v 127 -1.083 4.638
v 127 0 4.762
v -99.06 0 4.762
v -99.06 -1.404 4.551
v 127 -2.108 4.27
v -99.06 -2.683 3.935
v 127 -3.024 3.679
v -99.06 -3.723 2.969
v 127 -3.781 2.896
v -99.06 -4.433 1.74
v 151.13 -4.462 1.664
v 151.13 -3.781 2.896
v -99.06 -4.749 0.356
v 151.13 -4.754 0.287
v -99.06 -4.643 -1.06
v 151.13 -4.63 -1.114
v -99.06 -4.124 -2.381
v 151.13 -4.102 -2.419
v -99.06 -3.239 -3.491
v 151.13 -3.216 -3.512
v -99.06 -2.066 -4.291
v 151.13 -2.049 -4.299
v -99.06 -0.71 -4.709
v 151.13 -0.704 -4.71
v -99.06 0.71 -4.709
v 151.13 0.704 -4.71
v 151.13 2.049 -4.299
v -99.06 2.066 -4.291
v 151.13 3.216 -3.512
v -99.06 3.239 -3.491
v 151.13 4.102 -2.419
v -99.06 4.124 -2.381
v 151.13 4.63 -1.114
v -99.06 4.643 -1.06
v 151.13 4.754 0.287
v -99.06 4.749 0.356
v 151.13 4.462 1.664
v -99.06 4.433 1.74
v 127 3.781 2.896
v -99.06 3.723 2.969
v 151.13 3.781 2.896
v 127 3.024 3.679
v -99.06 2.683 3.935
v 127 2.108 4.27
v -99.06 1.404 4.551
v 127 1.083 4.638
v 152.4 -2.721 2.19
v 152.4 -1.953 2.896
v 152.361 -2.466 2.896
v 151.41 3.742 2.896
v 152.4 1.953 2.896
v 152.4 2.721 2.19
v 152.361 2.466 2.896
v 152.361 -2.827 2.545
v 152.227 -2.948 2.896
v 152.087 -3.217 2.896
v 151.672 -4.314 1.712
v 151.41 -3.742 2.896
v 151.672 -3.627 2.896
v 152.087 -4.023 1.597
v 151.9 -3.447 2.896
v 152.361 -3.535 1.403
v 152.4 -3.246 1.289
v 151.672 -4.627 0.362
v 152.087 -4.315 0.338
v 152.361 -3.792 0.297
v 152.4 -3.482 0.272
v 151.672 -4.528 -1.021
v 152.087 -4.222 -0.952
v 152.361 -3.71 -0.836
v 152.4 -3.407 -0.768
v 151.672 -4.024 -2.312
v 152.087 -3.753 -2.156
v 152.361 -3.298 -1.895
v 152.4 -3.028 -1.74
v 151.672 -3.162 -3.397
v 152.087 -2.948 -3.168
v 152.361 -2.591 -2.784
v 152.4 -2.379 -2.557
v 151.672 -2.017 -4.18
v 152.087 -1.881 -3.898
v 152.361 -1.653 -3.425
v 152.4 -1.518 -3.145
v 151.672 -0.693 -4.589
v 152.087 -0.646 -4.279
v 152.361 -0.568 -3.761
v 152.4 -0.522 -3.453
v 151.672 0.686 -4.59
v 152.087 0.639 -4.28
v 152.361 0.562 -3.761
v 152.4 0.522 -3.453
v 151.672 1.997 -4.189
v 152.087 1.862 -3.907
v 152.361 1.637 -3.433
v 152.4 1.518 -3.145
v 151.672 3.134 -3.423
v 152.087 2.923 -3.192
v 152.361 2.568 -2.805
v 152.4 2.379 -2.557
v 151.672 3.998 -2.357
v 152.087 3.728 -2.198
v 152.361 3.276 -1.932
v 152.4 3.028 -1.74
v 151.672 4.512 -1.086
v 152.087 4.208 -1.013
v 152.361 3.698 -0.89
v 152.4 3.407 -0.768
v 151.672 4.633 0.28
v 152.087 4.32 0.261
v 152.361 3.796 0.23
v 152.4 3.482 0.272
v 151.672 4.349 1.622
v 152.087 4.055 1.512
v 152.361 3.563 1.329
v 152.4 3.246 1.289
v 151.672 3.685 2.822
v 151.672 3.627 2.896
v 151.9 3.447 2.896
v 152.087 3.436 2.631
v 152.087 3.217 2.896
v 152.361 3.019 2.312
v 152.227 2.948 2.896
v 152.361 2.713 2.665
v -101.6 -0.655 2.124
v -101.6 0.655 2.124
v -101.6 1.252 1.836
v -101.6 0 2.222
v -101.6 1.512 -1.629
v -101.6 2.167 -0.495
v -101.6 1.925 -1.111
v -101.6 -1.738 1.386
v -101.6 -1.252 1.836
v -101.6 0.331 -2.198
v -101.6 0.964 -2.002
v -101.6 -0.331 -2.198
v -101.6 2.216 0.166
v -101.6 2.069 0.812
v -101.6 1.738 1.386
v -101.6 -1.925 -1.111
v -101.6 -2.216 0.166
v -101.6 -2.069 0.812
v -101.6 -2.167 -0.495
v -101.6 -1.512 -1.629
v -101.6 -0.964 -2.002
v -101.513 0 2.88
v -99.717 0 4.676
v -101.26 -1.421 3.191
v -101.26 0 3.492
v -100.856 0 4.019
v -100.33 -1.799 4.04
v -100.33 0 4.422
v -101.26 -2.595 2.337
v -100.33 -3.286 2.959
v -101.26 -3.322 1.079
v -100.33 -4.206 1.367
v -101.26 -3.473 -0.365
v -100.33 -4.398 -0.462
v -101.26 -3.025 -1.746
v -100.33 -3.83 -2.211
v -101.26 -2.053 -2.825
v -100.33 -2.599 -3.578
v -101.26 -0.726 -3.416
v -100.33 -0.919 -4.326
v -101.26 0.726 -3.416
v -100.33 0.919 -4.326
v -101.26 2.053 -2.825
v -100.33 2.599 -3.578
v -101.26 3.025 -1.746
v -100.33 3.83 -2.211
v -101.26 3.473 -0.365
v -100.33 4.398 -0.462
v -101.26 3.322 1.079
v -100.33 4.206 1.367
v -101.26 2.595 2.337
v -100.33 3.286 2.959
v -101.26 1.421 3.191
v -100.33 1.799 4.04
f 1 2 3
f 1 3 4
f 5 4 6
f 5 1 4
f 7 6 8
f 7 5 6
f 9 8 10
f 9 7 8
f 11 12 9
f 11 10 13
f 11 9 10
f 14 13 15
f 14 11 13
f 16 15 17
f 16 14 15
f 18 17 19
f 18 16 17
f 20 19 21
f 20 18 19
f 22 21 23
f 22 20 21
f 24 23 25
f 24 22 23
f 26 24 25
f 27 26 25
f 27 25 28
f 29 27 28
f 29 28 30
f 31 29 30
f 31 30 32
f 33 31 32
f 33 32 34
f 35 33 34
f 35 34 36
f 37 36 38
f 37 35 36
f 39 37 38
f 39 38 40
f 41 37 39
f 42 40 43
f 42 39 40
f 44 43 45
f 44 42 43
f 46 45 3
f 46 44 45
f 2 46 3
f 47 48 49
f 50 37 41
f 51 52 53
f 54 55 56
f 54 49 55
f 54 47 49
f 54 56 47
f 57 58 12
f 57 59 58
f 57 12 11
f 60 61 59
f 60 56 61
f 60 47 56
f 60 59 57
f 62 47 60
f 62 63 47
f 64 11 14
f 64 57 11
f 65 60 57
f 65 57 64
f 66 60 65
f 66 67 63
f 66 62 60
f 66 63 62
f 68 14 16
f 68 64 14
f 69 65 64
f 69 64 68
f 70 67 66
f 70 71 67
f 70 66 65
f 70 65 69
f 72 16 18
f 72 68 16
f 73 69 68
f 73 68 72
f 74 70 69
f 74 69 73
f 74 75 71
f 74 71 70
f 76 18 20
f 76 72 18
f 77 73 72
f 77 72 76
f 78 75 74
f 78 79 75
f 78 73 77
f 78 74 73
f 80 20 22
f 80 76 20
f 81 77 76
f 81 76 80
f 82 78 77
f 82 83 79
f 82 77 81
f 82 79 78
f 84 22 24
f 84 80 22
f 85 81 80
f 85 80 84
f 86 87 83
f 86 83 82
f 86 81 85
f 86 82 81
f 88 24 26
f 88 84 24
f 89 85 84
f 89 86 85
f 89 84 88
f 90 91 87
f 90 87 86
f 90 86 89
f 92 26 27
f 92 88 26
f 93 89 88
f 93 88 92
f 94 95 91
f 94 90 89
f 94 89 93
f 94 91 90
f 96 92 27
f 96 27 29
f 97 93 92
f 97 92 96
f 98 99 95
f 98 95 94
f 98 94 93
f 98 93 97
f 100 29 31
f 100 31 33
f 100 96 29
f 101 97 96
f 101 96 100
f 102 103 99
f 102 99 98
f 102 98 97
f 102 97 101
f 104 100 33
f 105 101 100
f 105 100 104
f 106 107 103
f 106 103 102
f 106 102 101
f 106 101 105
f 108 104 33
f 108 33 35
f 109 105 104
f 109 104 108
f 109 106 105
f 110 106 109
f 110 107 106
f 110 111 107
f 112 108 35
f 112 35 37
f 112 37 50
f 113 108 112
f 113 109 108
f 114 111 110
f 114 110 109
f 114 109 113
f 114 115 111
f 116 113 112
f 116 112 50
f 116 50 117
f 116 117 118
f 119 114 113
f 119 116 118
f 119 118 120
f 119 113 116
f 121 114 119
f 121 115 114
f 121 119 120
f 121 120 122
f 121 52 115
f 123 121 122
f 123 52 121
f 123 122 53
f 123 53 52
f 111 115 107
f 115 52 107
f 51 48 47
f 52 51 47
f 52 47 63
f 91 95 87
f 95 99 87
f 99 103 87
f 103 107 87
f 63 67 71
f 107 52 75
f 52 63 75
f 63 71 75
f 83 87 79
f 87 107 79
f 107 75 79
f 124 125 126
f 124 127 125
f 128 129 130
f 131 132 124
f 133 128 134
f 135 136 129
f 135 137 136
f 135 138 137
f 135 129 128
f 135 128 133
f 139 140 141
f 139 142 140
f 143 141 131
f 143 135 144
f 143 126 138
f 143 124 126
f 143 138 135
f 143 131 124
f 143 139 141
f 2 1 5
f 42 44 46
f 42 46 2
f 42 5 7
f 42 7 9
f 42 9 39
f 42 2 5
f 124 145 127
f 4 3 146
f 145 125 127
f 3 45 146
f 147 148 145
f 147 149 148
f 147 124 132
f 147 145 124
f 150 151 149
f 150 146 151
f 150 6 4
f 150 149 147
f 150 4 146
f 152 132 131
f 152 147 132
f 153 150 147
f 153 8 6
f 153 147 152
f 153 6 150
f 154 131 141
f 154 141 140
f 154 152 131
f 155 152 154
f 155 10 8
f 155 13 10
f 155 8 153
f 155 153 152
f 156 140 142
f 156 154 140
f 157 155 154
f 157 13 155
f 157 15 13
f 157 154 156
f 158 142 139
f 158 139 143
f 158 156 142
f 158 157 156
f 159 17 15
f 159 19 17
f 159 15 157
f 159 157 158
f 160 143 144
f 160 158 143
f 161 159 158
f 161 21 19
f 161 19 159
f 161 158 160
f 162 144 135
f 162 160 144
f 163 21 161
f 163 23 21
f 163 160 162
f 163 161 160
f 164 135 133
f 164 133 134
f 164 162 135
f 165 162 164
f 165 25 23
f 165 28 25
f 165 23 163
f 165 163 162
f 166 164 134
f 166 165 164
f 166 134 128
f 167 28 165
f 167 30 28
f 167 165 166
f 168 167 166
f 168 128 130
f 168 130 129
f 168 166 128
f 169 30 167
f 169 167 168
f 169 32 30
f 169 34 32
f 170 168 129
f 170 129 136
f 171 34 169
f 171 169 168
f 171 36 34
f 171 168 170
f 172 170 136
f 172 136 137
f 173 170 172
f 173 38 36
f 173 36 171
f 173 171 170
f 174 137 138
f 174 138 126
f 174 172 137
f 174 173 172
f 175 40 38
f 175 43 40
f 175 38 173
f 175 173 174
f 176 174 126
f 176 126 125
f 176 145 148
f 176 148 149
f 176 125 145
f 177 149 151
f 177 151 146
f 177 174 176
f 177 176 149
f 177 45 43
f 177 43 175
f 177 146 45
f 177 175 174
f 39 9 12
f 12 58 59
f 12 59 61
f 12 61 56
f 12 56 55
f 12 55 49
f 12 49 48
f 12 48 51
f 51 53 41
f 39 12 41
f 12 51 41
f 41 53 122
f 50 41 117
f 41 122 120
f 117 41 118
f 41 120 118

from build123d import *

# Parameters (mm, degrees)
F0_W     = 254
F0_H     = 4.7625
F3_DEPTH = 25.4
F4_R     = 2.54
F5_R     = 1.27


with BuildPart() as f1:
    # F0 (on Front) → F1 (revolve)
    with BuildSketch(Plane.XZ):
        with Locations((25.4, 2.38125)):
            Rectangle(F0_W, F0_H)
    revolve(axis=Axis((25.4, 0, 0), (1, 0, 0)))

    # F2 (on face) → F3 (cut)
    with BuildSketch(Plane.YZ.offset(152.4)):
        with BuildLine():
            ThreePointArc((3.781125, 2.8956), (0, 4.7625), (-3.781125, 2.8956))
            Line((-3.781125, 2.8956), (3.781125, 2.8956))
        make_face()
    extrude(amount=-F3_DEPTH, mode=Mode.SUBTRACT)

    # F4
    f4_edges = [f1.edges().sort_by_distance(p)[0] for p in [
        (-101.6, 0, -4.7625),
    ]]
    fillet(f4_edges, radius=F4_R)

    # F5
    f5_edges = [f1.edges().sort_by_distance(p)[0] for p in [
        (152.4, 0, -4.7625),
    ]]
    fillet(f5_edges, radius=F5_R)


solid = f1.part
